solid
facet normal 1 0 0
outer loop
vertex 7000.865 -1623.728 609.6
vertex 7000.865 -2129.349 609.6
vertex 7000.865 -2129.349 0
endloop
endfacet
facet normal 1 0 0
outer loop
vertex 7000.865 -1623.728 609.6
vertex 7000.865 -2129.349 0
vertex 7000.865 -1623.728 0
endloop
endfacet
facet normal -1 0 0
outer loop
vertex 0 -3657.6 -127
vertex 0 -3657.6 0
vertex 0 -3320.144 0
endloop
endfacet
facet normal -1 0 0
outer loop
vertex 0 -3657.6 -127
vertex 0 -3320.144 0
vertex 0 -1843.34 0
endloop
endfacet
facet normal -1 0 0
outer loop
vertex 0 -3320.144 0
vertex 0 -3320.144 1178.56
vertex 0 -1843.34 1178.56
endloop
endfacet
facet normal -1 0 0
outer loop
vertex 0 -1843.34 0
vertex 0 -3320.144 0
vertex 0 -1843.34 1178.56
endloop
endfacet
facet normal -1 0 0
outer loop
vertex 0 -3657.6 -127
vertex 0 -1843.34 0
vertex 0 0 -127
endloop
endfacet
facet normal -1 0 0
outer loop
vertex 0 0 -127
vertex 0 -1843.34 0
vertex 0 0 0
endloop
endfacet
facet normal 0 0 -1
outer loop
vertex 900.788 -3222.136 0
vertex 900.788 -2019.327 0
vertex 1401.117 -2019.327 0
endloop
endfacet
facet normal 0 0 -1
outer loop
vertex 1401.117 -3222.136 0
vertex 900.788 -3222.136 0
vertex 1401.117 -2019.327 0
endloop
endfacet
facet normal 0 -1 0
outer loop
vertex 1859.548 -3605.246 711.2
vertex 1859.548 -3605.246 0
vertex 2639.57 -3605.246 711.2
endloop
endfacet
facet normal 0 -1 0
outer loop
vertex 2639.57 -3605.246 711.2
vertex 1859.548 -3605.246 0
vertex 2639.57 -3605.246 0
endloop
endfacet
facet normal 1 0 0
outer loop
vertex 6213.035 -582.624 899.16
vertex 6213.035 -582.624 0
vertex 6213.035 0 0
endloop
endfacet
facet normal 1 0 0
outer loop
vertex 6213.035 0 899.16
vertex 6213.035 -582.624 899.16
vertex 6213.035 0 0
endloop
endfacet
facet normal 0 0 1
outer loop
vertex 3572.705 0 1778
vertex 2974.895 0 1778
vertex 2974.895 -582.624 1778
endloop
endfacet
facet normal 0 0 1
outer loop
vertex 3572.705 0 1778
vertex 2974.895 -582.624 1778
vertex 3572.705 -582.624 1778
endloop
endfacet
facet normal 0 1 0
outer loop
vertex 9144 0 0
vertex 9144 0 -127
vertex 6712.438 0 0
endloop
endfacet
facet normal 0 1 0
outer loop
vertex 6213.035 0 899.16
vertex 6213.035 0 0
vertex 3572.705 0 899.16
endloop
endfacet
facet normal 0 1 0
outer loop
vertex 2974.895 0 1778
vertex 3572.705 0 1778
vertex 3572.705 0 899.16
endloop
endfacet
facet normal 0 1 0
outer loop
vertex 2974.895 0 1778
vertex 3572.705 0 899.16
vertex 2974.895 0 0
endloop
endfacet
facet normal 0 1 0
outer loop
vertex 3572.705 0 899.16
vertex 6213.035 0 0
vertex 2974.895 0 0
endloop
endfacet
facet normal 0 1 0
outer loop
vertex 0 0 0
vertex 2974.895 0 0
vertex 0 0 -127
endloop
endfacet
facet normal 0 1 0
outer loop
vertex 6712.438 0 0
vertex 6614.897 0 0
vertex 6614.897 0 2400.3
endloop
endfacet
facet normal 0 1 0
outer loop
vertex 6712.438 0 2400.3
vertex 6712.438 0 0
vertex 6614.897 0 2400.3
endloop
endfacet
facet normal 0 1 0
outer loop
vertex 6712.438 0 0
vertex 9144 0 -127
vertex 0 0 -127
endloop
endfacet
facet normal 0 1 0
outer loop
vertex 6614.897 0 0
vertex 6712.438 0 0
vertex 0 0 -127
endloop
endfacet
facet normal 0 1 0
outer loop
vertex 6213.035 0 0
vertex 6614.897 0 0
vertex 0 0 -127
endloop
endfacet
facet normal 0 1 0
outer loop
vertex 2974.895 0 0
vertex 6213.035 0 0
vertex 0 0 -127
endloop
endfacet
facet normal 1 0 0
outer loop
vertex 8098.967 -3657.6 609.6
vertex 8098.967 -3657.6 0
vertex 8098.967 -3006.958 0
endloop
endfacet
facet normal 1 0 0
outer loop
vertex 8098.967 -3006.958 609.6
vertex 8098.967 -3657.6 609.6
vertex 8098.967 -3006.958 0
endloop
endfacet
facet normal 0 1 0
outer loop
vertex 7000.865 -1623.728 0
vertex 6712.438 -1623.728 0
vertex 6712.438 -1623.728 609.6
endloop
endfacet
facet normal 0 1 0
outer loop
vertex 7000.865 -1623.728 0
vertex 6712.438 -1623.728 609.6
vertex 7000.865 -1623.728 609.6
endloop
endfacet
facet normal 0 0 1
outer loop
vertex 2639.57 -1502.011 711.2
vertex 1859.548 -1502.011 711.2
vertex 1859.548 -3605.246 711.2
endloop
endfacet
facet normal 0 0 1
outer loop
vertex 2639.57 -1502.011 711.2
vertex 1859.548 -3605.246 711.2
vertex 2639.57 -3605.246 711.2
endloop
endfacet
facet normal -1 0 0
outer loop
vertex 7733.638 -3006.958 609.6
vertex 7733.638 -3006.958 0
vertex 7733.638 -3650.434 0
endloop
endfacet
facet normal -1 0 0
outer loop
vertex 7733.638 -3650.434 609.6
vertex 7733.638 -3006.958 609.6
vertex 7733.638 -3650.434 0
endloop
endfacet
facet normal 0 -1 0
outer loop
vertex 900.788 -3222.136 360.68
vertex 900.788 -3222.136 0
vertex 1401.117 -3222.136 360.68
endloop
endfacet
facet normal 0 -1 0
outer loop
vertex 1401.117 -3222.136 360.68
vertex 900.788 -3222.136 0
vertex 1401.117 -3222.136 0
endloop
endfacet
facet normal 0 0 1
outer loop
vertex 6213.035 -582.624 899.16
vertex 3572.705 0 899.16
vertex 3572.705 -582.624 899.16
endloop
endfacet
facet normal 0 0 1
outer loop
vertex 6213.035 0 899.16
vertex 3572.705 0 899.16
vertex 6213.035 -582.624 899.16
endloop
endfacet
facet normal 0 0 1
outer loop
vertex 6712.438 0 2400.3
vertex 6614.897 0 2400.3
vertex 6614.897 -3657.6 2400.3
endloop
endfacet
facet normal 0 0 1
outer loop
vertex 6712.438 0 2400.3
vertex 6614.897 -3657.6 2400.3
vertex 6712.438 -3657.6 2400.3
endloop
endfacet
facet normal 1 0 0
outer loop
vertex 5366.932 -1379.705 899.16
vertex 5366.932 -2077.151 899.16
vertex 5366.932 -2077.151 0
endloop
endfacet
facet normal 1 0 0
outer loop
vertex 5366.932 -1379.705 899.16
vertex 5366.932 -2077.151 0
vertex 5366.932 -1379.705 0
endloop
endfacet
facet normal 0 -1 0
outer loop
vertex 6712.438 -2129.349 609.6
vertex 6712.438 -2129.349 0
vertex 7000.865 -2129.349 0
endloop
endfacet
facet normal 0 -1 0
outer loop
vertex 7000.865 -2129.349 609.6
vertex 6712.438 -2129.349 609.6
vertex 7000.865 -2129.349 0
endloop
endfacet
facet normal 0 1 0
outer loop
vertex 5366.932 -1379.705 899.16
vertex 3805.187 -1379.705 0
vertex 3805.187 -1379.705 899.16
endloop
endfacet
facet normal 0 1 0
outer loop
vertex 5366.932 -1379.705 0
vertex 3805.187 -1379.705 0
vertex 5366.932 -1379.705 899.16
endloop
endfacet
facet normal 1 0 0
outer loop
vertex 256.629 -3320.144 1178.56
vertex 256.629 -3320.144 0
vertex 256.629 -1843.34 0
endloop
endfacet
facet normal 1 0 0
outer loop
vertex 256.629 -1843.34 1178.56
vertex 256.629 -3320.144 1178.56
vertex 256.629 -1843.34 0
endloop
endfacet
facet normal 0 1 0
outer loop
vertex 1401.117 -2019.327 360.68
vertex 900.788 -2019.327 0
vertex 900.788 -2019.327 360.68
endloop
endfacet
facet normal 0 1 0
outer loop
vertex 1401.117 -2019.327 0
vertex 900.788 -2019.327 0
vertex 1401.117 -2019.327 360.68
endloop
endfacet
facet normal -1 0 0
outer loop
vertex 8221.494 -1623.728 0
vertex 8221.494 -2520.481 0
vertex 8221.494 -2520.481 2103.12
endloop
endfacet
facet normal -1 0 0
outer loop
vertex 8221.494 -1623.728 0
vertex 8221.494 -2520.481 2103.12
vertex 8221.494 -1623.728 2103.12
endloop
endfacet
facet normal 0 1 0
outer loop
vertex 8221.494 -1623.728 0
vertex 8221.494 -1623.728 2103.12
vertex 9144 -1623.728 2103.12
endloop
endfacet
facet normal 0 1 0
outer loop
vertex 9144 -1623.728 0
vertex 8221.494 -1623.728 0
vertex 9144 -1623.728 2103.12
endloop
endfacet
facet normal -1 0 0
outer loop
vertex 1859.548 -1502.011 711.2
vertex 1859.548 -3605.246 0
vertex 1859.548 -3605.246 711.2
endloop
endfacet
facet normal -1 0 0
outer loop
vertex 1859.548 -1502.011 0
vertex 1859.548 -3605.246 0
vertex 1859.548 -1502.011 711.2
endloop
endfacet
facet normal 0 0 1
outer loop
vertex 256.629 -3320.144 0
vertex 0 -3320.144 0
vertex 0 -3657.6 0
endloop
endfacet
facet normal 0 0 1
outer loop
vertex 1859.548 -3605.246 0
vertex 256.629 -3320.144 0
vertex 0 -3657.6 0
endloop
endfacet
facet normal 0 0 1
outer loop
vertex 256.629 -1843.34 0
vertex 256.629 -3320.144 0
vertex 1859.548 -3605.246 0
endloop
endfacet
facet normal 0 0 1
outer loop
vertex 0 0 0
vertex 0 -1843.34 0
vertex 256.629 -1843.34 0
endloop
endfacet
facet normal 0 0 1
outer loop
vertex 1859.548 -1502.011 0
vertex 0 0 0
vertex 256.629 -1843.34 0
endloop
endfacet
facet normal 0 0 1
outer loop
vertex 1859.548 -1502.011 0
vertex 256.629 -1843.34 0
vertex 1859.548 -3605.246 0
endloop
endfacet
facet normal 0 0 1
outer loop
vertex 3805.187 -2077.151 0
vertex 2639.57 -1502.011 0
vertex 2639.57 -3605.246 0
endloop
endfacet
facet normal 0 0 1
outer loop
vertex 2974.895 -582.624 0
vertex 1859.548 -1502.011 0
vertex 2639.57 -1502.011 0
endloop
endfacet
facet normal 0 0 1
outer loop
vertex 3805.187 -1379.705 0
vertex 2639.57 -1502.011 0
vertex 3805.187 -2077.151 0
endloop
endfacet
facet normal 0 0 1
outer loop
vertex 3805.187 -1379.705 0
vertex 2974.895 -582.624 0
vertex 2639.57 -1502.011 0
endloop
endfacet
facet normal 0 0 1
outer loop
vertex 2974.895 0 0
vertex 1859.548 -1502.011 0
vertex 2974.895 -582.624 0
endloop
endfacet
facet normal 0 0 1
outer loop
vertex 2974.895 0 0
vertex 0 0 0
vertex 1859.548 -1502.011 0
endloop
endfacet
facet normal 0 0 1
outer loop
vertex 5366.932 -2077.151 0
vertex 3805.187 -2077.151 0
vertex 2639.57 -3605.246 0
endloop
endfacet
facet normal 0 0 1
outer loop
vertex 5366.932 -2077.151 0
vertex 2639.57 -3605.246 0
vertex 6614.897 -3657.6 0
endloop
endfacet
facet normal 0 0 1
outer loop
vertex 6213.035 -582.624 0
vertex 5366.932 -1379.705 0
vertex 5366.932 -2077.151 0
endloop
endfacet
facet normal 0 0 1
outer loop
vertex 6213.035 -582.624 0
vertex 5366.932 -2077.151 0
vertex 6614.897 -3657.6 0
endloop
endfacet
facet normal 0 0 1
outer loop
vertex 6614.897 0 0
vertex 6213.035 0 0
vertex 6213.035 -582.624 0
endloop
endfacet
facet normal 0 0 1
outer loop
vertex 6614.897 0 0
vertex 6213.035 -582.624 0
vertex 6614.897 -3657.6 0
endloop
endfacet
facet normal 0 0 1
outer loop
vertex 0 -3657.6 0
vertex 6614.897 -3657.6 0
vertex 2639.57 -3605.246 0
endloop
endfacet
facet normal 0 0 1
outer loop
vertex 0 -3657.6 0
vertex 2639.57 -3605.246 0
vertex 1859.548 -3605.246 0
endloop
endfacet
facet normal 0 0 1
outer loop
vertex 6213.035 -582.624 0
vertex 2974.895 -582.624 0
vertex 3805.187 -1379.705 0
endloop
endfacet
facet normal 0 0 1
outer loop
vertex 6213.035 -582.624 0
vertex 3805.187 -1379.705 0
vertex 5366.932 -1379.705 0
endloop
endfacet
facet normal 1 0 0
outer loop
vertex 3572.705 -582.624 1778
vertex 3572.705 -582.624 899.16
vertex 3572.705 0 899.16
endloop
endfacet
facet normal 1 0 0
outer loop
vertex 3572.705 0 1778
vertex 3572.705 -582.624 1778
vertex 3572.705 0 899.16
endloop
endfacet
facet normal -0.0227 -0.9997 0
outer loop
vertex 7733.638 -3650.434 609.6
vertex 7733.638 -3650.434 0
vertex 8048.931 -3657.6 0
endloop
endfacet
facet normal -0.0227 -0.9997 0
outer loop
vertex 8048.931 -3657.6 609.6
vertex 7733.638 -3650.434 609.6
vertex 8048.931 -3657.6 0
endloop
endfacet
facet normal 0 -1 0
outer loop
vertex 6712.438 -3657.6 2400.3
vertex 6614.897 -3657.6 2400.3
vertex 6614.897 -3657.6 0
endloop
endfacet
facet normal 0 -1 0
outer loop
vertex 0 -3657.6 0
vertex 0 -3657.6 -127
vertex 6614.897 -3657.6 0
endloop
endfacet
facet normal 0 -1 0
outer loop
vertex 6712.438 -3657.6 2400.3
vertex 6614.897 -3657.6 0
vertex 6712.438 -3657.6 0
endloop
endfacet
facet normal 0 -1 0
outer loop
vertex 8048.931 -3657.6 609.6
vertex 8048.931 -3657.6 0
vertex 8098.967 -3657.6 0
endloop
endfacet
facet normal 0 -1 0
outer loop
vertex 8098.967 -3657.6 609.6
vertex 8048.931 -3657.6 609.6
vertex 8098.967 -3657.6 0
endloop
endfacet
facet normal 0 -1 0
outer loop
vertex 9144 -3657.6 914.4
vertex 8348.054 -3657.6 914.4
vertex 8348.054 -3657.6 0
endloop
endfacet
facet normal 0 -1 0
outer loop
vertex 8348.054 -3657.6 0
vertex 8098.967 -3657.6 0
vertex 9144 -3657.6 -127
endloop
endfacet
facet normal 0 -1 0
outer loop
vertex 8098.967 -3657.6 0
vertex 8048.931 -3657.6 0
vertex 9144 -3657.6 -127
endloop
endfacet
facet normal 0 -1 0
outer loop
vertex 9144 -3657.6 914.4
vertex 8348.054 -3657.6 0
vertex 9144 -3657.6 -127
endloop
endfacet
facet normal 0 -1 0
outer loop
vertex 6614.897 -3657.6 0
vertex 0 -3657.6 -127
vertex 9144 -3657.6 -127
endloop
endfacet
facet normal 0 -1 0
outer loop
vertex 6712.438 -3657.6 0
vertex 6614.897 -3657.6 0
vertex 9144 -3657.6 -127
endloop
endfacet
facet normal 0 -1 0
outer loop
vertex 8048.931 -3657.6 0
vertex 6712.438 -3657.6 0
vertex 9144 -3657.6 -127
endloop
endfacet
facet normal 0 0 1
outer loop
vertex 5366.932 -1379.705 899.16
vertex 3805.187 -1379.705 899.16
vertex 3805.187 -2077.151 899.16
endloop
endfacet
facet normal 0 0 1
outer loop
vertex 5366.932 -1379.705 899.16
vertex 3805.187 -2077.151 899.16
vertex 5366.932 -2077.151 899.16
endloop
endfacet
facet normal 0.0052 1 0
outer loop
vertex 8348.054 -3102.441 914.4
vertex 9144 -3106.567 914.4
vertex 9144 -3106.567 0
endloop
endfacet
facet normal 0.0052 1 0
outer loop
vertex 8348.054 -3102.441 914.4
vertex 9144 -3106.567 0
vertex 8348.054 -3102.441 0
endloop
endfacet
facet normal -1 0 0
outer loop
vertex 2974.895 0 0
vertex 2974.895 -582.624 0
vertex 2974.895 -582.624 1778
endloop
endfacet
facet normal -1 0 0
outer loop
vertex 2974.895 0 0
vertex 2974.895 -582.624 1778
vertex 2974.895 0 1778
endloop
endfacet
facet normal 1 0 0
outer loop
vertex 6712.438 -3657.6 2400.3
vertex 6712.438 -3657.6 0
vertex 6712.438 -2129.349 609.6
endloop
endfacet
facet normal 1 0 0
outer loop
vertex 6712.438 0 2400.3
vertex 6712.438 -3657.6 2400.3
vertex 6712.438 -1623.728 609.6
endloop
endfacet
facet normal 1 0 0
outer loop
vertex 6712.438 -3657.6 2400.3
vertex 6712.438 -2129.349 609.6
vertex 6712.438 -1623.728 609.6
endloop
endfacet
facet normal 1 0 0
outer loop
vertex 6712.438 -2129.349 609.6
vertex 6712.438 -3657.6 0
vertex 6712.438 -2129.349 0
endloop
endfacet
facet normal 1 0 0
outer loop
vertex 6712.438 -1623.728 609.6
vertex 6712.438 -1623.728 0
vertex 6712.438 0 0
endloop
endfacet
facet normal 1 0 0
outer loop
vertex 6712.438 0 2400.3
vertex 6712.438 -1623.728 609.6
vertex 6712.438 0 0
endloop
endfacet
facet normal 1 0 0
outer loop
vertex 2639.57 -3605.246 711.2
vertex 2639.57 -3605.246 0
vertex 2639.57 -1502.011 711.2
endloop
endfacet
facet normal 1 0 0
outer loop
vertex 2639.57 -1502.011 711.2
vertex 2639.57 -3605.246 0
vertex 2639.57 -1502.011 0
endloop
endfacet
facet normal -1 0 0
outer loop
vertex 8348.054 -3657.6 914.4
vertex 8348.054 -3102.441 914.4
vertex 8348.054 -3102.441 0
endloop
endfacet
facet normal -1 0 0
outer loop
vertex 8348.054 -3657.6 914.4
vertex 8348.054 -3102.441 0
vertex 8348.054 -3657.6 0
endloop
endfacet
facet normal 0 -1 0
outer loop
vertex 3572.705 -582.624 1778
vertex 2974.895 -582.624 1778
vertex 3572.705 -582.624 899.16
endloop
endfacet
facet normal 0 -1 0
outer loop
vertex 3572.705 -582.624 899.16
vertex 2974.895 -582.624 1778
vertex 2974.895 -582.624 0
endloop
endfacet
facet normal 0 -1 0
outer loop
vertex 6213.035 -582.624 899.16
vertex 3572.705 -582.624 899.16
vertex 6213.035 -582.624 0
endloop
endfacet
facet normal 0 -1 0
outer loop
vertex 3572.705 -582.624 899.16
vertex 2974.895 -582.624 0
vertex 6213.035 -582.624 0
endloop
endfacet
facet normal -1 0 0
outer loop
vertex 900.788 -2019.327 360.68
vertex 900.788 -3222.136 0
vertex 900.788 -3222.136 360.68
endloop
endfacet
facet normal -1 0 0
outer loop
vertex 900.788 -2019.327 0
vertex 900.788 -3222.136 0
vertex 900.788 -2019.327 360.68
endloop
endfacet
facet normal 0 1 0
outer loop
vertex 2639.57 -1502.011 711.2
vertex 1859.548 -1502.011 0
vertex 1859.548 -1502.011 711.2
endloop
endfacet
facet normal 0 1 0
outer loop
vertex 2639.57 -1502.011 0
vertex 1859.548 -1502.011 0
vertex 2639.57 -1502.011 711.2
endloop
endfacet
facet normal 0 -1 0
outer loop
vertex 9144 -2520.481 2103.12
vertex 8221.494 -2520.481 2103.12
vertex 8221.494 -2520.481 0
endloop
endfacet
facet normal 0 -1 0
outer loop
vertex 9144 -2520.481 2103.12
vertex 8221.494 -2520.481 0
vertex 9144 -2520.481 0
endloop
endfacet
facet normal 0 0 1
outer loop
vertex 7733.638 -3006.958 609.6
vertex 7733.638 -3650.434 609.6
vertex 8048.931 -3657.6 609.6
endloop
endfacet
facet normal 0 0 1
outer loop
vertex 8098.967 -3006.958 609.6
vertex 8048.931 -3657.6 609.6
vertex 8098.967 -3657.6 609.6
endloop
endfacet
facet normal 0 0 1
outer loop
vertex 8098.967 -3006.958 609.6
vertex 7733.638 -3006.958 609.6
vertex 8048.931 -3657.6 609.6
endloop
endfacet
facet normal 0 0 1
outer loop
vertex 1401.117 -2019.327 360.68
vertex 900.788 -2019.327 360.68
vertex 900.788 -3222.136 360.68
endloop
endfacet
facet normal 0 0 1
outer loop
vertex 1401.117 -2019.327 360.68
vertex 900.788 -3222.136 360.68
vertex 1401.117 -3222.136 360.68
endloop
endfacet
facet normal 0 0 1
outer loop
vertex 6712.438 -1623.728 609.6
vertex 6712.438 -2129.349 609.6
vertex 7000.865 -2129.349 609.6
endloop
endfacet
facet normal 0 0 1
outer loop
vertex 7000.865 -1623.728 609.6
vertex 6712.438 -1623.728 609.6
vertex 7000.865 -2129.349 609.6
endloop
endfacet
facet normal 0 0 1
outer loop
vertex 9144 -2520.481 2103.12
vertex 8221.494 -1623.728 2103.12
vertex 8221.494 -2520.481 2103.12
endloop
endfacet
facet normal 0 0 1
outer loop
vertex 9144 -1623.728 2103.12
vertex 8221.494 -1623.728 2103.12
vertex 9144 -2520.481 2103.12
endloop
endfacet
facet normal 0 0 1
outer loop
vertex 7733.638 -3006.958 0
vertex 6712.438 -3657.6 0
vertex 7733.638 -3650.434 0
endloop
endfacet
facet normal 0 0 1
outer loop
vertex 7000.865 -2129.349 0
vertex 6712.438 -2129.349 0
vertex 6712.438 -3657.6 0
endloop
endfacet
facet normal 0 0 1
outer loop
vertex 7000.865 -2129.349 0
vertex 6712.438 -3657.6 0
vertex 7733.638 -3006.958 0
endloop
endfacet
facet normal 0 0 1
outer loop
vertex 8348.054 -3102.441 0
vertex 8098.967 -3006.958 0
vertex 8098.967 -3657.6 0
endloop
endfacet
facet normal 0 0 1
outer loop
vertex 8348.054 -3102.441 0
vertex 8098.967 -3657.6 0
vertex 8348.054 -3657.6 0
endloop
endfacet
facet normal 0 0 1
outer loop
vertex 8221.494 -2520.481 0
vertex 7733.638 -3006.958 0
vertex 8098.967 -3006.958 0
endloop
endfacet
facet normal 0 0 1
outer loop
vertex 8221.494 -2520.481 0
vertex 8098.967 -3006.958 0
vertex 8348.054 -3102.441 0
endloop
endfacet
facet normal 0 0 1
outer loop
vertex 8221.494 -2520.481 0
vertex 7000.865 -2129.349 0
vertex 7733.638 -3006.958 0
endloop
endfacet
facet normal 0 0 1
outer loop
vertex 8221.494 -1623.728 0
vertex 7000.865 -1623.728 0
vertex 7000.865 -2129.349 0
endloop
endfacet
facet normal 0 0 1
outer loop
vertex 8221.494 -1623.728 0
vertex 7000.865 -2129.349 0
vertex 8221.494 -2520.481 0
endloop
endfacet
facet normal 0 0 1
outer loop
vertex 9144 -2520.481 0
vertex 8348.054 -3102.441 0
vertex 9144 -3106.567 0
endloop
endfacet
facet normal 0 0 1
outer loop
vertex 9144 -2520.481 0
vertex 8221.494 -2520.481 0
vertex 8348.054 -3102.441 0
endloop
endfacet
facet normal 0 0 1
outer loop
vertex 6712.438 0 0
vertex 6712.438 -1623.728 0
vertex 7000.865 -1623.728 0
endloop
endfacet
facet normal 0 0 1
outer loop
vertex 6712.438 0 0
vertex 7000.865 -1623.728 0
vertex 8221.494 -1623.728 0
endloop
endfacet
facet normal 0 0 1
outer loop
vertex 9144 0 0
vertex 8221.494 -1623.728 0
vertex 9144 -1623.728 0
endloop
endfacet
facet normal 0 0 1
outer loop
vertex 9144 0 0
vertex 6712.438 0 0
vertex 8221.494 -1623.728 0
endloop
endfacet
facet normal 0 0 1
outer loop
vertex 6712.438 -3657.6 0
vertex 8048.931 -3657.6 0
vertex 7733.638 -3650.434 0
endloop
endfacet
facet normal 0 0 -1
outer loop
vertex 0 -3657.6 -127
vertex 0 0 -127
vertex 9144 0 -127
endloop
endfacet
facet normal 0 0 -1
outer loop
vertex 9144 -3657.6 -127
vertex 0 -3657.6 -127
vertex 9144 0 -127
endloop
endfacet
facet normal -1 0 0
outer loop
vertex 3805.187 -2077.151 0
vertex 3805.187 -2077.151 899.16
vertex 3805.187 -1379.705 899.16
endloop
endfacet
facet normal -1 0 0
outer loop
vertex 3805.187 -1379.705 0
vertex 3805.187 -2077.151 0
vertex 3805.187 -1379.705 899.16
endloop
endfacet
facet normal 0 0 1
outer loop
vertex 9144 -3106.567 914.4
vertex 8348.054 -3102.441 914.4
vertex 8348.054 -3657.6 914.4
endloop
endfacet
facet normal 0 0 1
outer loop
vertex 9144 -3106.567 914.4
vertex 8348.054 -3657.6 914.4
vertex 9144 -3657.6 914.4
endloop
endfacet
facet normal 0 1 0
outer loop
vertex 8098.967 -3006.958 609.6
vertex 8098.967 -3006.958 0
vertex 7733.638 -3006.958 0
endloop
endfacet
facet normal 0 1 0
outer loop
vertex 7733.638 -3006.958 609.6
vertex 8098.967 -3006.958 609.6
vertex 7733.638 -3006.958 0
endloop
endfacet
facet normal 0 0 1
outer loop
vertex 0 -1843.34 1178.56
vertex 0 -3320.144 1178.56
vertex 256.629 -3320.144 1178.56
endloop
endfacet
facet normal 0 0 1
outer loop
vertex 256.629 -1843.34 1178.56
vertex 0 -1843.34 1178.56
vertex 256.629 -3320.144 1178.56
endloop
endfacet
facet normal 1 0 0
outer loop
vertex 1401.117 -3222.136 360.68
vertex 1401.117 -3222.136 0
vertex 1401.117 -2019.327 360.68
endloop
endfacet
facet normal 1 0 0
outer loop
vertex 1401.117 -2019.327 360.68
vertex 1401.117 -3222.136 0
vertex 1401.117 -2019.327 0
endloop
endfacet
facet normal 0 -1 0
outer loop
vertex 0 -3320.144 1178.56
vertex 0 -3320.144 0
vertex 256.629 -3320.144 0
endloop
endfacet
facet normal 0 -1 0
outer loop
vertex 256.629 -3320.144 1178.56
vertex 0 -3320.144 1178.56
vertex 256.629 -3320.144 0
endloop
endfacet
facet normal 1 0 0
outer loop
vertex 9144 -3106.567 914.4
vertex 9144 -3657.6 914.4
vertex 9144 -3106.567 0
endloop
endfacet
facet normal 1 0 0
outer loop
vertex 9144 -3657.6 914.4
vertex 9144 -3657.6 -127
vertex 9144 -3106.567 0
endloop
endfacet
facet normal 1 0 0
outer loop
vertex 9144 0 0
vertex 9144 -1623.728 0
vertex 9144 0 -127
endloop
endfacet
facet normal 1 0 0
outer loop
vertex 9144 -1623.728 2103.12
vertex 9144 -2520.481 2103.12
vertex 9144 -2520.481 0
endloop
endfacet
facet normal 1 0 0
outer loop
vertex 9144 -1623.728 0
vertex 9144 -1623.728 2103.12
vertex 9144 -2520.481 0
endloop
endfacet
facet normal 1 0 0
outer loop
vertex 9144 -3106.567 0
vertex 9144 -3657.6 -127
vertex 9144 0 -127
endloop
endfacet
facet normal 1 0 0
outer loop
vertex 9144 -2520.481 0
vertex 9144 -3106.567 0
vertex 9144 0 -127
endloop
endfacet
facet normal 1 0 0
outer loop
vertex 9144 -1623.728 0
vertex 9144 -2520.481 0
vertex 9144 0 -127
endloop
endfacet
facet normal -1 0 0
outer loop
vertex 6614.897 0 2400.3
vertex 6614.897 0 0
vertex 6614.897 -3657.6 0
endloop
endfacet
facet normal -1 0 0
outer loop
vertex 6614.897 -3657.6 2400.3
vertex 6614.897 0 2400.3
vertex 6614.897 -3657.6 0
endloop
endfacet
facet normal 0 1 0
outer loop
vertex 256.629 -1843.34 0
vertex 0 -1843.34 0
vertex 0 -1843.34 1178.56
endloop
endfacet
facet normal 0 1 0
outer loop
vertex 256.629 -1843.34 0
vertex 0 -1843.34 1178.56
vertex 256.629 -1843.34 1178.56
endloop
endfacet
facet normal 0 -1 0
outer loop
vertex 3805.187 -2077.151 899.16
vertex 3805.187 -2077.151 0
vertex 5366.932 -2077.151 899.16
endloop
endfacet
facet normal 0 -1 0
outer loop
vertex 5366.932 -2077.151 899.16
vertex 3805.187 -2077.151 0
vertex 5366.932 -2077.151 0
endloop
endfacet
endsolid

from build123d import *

# Parameters (mm, degrees)
F0_W      = 9144
F0_H      = 3657.6
F1_DEPTH  = 127
F3_W      = 780.0215498552
F3_H      = 2103.2353639603
F4_DEPTH  = 711.2
F3_W_2    = 500.3285744119
F3_H_2    = 1202.8086185455
F5_DEPTH  = 360.68
F3_W_3    = 256.6292881966
F3_H_3    = 1476.8042564392
F6_DEPTH  = 1178.56
F3_W_4    = 597.8105068207
F3_H_4    = 582.6244354248
F7_DEPTH  = 1778
F3_W_5    = 2640.3298377991
F8_DEPTH  = 899.16
F3_W_6    = 1561.7445614128
F3_H_5    = 697.4456310272
F9_DEPTH  = 899.16
F3_W_7    = 288.4268760681
F3_H_6    = 505.6204795837
F10_DEPTH = 609.6
F11_DEPTH = 609.6
F3_W_8    = 922.5062789917
F3_H_7    = 896.7530727386
F12_DEPTH = 2103.12
F13_DEPTH = 914.4
F14_DEPTH = 2400.3


with BuildPart() as f1:
    # F0 (on Top) → F1 (new body)
    with BuildSketch(Plane.XY):
        with Locations((4572, -1828.8)):
            Rectangle(F0_W, F0_H)
    extrude(amount=-F1_DEPTH)

    # F3 (on face) → F4 (join)
    with BuildSketch(Plane.XY):
        with Locations((2249.5587476067, -2553.6286234856)):
            Rectangle(F3_W, F3_H)
    extrude(amount=F4_DEPTH)

    # F3 (on face) → F6 (join)
    with BuildSketch(Plane.XY):
        with Locations((128.3146440983, -2581.7420482635)):
            Rectangle(F3_W_3, F3_H_3)
    extrude(amount=F6_DEPTH)

    # F3 (on face) → F7 (join)
    with BuildSketch(Plane.XY):
        with Locations((3273.8000154495, -291.3122177124)):
            Rectangle(F3_W_4, F3_H_4)
    extrude(amount=F7_DEPTH)

    # F3 (on face) → F8 (join)
    with BuildSketch(Plane.XY):
        with Locations((4892.8701877594, -291.3122177124)):
            Rectangle(F3_W_5, F3_H_4)
    extrude(amount=F8_DEPTH)

    # F3 (on face) → F9 (join)
    with BuildSketch(Plane.XY):
        with Locations((4586.0595060482, -1728.4280061722)):
            Rectangle(F3_W_6, F3_H_5)
    extrude(amount=F9_DEPTH)

    # F3 (on face) → F10 (join)
    with BuildSketch(Plane.XY):
        with Locations((6856.6510677338, -1876.5382766724)):
            Rectangle(F3_W_7, F3_H_6)
    extrude(amount=F10_DEPTH)

    # F3 (on face) → F11 (join)
    with BuildSketch(Plane.XY):
        Polygon((7733.6378097534, -3650.4342556), (8048.9305633538, -3657.6), (8098.9665985107, -3657.6), (8098.9665985107, -3006.9575309753), (7733.6378097534, -3006.9575309753), align=None)
    extrude(amount=F11_DEPTH)

    # F3 (on face) → F12 (join)
    with BuildSketch(Plane.XY):
        with Locations((8682.7468605042, -2072.1045732498)):
            Rectangle(F3_W_8, F3_H_7)
    extrude(amount=F12_DEPTH)

    # F3 (on face) → F13 (join)
    with BuildSketch(Plane.XY):
        Polygon((8348.0539321899, -3102.441072464), (8348.0539321899, -3657.6), (9144, -3657.6), (9144, -3106.5671256875), align=None)
    extrude(amount=F13_DEPTH)

    # F3 (on face) → F14 (join)
    with BuildSketch(Plane.XY):
        Polygon((6614.8972511292, 0), (6614.8972511292, -3657.6), (6712.4376296997, -3657.6), (6712.4376296997, -3156.0730934143), (6712.4376296997, -2129.3485164642), (6712.4376296997, -1623.7280368805), (6712.4376296997, -1578.0365467072), (6712.4376296997, 0), align=None)
    extrude(amount=F14_DEPTH)


with BuildPart() as f5:
    # F3 (on face) → F5 (new body)
    with BuildSketch(Plane.XY):
        with Locations((1150.9523559773, -2620.7317113876)):
            Rectangle(F3_W_2, F3_H_2)
    extrude(amount=F5_DEPTH)


solid = Compound([f1.part, f5.part])
